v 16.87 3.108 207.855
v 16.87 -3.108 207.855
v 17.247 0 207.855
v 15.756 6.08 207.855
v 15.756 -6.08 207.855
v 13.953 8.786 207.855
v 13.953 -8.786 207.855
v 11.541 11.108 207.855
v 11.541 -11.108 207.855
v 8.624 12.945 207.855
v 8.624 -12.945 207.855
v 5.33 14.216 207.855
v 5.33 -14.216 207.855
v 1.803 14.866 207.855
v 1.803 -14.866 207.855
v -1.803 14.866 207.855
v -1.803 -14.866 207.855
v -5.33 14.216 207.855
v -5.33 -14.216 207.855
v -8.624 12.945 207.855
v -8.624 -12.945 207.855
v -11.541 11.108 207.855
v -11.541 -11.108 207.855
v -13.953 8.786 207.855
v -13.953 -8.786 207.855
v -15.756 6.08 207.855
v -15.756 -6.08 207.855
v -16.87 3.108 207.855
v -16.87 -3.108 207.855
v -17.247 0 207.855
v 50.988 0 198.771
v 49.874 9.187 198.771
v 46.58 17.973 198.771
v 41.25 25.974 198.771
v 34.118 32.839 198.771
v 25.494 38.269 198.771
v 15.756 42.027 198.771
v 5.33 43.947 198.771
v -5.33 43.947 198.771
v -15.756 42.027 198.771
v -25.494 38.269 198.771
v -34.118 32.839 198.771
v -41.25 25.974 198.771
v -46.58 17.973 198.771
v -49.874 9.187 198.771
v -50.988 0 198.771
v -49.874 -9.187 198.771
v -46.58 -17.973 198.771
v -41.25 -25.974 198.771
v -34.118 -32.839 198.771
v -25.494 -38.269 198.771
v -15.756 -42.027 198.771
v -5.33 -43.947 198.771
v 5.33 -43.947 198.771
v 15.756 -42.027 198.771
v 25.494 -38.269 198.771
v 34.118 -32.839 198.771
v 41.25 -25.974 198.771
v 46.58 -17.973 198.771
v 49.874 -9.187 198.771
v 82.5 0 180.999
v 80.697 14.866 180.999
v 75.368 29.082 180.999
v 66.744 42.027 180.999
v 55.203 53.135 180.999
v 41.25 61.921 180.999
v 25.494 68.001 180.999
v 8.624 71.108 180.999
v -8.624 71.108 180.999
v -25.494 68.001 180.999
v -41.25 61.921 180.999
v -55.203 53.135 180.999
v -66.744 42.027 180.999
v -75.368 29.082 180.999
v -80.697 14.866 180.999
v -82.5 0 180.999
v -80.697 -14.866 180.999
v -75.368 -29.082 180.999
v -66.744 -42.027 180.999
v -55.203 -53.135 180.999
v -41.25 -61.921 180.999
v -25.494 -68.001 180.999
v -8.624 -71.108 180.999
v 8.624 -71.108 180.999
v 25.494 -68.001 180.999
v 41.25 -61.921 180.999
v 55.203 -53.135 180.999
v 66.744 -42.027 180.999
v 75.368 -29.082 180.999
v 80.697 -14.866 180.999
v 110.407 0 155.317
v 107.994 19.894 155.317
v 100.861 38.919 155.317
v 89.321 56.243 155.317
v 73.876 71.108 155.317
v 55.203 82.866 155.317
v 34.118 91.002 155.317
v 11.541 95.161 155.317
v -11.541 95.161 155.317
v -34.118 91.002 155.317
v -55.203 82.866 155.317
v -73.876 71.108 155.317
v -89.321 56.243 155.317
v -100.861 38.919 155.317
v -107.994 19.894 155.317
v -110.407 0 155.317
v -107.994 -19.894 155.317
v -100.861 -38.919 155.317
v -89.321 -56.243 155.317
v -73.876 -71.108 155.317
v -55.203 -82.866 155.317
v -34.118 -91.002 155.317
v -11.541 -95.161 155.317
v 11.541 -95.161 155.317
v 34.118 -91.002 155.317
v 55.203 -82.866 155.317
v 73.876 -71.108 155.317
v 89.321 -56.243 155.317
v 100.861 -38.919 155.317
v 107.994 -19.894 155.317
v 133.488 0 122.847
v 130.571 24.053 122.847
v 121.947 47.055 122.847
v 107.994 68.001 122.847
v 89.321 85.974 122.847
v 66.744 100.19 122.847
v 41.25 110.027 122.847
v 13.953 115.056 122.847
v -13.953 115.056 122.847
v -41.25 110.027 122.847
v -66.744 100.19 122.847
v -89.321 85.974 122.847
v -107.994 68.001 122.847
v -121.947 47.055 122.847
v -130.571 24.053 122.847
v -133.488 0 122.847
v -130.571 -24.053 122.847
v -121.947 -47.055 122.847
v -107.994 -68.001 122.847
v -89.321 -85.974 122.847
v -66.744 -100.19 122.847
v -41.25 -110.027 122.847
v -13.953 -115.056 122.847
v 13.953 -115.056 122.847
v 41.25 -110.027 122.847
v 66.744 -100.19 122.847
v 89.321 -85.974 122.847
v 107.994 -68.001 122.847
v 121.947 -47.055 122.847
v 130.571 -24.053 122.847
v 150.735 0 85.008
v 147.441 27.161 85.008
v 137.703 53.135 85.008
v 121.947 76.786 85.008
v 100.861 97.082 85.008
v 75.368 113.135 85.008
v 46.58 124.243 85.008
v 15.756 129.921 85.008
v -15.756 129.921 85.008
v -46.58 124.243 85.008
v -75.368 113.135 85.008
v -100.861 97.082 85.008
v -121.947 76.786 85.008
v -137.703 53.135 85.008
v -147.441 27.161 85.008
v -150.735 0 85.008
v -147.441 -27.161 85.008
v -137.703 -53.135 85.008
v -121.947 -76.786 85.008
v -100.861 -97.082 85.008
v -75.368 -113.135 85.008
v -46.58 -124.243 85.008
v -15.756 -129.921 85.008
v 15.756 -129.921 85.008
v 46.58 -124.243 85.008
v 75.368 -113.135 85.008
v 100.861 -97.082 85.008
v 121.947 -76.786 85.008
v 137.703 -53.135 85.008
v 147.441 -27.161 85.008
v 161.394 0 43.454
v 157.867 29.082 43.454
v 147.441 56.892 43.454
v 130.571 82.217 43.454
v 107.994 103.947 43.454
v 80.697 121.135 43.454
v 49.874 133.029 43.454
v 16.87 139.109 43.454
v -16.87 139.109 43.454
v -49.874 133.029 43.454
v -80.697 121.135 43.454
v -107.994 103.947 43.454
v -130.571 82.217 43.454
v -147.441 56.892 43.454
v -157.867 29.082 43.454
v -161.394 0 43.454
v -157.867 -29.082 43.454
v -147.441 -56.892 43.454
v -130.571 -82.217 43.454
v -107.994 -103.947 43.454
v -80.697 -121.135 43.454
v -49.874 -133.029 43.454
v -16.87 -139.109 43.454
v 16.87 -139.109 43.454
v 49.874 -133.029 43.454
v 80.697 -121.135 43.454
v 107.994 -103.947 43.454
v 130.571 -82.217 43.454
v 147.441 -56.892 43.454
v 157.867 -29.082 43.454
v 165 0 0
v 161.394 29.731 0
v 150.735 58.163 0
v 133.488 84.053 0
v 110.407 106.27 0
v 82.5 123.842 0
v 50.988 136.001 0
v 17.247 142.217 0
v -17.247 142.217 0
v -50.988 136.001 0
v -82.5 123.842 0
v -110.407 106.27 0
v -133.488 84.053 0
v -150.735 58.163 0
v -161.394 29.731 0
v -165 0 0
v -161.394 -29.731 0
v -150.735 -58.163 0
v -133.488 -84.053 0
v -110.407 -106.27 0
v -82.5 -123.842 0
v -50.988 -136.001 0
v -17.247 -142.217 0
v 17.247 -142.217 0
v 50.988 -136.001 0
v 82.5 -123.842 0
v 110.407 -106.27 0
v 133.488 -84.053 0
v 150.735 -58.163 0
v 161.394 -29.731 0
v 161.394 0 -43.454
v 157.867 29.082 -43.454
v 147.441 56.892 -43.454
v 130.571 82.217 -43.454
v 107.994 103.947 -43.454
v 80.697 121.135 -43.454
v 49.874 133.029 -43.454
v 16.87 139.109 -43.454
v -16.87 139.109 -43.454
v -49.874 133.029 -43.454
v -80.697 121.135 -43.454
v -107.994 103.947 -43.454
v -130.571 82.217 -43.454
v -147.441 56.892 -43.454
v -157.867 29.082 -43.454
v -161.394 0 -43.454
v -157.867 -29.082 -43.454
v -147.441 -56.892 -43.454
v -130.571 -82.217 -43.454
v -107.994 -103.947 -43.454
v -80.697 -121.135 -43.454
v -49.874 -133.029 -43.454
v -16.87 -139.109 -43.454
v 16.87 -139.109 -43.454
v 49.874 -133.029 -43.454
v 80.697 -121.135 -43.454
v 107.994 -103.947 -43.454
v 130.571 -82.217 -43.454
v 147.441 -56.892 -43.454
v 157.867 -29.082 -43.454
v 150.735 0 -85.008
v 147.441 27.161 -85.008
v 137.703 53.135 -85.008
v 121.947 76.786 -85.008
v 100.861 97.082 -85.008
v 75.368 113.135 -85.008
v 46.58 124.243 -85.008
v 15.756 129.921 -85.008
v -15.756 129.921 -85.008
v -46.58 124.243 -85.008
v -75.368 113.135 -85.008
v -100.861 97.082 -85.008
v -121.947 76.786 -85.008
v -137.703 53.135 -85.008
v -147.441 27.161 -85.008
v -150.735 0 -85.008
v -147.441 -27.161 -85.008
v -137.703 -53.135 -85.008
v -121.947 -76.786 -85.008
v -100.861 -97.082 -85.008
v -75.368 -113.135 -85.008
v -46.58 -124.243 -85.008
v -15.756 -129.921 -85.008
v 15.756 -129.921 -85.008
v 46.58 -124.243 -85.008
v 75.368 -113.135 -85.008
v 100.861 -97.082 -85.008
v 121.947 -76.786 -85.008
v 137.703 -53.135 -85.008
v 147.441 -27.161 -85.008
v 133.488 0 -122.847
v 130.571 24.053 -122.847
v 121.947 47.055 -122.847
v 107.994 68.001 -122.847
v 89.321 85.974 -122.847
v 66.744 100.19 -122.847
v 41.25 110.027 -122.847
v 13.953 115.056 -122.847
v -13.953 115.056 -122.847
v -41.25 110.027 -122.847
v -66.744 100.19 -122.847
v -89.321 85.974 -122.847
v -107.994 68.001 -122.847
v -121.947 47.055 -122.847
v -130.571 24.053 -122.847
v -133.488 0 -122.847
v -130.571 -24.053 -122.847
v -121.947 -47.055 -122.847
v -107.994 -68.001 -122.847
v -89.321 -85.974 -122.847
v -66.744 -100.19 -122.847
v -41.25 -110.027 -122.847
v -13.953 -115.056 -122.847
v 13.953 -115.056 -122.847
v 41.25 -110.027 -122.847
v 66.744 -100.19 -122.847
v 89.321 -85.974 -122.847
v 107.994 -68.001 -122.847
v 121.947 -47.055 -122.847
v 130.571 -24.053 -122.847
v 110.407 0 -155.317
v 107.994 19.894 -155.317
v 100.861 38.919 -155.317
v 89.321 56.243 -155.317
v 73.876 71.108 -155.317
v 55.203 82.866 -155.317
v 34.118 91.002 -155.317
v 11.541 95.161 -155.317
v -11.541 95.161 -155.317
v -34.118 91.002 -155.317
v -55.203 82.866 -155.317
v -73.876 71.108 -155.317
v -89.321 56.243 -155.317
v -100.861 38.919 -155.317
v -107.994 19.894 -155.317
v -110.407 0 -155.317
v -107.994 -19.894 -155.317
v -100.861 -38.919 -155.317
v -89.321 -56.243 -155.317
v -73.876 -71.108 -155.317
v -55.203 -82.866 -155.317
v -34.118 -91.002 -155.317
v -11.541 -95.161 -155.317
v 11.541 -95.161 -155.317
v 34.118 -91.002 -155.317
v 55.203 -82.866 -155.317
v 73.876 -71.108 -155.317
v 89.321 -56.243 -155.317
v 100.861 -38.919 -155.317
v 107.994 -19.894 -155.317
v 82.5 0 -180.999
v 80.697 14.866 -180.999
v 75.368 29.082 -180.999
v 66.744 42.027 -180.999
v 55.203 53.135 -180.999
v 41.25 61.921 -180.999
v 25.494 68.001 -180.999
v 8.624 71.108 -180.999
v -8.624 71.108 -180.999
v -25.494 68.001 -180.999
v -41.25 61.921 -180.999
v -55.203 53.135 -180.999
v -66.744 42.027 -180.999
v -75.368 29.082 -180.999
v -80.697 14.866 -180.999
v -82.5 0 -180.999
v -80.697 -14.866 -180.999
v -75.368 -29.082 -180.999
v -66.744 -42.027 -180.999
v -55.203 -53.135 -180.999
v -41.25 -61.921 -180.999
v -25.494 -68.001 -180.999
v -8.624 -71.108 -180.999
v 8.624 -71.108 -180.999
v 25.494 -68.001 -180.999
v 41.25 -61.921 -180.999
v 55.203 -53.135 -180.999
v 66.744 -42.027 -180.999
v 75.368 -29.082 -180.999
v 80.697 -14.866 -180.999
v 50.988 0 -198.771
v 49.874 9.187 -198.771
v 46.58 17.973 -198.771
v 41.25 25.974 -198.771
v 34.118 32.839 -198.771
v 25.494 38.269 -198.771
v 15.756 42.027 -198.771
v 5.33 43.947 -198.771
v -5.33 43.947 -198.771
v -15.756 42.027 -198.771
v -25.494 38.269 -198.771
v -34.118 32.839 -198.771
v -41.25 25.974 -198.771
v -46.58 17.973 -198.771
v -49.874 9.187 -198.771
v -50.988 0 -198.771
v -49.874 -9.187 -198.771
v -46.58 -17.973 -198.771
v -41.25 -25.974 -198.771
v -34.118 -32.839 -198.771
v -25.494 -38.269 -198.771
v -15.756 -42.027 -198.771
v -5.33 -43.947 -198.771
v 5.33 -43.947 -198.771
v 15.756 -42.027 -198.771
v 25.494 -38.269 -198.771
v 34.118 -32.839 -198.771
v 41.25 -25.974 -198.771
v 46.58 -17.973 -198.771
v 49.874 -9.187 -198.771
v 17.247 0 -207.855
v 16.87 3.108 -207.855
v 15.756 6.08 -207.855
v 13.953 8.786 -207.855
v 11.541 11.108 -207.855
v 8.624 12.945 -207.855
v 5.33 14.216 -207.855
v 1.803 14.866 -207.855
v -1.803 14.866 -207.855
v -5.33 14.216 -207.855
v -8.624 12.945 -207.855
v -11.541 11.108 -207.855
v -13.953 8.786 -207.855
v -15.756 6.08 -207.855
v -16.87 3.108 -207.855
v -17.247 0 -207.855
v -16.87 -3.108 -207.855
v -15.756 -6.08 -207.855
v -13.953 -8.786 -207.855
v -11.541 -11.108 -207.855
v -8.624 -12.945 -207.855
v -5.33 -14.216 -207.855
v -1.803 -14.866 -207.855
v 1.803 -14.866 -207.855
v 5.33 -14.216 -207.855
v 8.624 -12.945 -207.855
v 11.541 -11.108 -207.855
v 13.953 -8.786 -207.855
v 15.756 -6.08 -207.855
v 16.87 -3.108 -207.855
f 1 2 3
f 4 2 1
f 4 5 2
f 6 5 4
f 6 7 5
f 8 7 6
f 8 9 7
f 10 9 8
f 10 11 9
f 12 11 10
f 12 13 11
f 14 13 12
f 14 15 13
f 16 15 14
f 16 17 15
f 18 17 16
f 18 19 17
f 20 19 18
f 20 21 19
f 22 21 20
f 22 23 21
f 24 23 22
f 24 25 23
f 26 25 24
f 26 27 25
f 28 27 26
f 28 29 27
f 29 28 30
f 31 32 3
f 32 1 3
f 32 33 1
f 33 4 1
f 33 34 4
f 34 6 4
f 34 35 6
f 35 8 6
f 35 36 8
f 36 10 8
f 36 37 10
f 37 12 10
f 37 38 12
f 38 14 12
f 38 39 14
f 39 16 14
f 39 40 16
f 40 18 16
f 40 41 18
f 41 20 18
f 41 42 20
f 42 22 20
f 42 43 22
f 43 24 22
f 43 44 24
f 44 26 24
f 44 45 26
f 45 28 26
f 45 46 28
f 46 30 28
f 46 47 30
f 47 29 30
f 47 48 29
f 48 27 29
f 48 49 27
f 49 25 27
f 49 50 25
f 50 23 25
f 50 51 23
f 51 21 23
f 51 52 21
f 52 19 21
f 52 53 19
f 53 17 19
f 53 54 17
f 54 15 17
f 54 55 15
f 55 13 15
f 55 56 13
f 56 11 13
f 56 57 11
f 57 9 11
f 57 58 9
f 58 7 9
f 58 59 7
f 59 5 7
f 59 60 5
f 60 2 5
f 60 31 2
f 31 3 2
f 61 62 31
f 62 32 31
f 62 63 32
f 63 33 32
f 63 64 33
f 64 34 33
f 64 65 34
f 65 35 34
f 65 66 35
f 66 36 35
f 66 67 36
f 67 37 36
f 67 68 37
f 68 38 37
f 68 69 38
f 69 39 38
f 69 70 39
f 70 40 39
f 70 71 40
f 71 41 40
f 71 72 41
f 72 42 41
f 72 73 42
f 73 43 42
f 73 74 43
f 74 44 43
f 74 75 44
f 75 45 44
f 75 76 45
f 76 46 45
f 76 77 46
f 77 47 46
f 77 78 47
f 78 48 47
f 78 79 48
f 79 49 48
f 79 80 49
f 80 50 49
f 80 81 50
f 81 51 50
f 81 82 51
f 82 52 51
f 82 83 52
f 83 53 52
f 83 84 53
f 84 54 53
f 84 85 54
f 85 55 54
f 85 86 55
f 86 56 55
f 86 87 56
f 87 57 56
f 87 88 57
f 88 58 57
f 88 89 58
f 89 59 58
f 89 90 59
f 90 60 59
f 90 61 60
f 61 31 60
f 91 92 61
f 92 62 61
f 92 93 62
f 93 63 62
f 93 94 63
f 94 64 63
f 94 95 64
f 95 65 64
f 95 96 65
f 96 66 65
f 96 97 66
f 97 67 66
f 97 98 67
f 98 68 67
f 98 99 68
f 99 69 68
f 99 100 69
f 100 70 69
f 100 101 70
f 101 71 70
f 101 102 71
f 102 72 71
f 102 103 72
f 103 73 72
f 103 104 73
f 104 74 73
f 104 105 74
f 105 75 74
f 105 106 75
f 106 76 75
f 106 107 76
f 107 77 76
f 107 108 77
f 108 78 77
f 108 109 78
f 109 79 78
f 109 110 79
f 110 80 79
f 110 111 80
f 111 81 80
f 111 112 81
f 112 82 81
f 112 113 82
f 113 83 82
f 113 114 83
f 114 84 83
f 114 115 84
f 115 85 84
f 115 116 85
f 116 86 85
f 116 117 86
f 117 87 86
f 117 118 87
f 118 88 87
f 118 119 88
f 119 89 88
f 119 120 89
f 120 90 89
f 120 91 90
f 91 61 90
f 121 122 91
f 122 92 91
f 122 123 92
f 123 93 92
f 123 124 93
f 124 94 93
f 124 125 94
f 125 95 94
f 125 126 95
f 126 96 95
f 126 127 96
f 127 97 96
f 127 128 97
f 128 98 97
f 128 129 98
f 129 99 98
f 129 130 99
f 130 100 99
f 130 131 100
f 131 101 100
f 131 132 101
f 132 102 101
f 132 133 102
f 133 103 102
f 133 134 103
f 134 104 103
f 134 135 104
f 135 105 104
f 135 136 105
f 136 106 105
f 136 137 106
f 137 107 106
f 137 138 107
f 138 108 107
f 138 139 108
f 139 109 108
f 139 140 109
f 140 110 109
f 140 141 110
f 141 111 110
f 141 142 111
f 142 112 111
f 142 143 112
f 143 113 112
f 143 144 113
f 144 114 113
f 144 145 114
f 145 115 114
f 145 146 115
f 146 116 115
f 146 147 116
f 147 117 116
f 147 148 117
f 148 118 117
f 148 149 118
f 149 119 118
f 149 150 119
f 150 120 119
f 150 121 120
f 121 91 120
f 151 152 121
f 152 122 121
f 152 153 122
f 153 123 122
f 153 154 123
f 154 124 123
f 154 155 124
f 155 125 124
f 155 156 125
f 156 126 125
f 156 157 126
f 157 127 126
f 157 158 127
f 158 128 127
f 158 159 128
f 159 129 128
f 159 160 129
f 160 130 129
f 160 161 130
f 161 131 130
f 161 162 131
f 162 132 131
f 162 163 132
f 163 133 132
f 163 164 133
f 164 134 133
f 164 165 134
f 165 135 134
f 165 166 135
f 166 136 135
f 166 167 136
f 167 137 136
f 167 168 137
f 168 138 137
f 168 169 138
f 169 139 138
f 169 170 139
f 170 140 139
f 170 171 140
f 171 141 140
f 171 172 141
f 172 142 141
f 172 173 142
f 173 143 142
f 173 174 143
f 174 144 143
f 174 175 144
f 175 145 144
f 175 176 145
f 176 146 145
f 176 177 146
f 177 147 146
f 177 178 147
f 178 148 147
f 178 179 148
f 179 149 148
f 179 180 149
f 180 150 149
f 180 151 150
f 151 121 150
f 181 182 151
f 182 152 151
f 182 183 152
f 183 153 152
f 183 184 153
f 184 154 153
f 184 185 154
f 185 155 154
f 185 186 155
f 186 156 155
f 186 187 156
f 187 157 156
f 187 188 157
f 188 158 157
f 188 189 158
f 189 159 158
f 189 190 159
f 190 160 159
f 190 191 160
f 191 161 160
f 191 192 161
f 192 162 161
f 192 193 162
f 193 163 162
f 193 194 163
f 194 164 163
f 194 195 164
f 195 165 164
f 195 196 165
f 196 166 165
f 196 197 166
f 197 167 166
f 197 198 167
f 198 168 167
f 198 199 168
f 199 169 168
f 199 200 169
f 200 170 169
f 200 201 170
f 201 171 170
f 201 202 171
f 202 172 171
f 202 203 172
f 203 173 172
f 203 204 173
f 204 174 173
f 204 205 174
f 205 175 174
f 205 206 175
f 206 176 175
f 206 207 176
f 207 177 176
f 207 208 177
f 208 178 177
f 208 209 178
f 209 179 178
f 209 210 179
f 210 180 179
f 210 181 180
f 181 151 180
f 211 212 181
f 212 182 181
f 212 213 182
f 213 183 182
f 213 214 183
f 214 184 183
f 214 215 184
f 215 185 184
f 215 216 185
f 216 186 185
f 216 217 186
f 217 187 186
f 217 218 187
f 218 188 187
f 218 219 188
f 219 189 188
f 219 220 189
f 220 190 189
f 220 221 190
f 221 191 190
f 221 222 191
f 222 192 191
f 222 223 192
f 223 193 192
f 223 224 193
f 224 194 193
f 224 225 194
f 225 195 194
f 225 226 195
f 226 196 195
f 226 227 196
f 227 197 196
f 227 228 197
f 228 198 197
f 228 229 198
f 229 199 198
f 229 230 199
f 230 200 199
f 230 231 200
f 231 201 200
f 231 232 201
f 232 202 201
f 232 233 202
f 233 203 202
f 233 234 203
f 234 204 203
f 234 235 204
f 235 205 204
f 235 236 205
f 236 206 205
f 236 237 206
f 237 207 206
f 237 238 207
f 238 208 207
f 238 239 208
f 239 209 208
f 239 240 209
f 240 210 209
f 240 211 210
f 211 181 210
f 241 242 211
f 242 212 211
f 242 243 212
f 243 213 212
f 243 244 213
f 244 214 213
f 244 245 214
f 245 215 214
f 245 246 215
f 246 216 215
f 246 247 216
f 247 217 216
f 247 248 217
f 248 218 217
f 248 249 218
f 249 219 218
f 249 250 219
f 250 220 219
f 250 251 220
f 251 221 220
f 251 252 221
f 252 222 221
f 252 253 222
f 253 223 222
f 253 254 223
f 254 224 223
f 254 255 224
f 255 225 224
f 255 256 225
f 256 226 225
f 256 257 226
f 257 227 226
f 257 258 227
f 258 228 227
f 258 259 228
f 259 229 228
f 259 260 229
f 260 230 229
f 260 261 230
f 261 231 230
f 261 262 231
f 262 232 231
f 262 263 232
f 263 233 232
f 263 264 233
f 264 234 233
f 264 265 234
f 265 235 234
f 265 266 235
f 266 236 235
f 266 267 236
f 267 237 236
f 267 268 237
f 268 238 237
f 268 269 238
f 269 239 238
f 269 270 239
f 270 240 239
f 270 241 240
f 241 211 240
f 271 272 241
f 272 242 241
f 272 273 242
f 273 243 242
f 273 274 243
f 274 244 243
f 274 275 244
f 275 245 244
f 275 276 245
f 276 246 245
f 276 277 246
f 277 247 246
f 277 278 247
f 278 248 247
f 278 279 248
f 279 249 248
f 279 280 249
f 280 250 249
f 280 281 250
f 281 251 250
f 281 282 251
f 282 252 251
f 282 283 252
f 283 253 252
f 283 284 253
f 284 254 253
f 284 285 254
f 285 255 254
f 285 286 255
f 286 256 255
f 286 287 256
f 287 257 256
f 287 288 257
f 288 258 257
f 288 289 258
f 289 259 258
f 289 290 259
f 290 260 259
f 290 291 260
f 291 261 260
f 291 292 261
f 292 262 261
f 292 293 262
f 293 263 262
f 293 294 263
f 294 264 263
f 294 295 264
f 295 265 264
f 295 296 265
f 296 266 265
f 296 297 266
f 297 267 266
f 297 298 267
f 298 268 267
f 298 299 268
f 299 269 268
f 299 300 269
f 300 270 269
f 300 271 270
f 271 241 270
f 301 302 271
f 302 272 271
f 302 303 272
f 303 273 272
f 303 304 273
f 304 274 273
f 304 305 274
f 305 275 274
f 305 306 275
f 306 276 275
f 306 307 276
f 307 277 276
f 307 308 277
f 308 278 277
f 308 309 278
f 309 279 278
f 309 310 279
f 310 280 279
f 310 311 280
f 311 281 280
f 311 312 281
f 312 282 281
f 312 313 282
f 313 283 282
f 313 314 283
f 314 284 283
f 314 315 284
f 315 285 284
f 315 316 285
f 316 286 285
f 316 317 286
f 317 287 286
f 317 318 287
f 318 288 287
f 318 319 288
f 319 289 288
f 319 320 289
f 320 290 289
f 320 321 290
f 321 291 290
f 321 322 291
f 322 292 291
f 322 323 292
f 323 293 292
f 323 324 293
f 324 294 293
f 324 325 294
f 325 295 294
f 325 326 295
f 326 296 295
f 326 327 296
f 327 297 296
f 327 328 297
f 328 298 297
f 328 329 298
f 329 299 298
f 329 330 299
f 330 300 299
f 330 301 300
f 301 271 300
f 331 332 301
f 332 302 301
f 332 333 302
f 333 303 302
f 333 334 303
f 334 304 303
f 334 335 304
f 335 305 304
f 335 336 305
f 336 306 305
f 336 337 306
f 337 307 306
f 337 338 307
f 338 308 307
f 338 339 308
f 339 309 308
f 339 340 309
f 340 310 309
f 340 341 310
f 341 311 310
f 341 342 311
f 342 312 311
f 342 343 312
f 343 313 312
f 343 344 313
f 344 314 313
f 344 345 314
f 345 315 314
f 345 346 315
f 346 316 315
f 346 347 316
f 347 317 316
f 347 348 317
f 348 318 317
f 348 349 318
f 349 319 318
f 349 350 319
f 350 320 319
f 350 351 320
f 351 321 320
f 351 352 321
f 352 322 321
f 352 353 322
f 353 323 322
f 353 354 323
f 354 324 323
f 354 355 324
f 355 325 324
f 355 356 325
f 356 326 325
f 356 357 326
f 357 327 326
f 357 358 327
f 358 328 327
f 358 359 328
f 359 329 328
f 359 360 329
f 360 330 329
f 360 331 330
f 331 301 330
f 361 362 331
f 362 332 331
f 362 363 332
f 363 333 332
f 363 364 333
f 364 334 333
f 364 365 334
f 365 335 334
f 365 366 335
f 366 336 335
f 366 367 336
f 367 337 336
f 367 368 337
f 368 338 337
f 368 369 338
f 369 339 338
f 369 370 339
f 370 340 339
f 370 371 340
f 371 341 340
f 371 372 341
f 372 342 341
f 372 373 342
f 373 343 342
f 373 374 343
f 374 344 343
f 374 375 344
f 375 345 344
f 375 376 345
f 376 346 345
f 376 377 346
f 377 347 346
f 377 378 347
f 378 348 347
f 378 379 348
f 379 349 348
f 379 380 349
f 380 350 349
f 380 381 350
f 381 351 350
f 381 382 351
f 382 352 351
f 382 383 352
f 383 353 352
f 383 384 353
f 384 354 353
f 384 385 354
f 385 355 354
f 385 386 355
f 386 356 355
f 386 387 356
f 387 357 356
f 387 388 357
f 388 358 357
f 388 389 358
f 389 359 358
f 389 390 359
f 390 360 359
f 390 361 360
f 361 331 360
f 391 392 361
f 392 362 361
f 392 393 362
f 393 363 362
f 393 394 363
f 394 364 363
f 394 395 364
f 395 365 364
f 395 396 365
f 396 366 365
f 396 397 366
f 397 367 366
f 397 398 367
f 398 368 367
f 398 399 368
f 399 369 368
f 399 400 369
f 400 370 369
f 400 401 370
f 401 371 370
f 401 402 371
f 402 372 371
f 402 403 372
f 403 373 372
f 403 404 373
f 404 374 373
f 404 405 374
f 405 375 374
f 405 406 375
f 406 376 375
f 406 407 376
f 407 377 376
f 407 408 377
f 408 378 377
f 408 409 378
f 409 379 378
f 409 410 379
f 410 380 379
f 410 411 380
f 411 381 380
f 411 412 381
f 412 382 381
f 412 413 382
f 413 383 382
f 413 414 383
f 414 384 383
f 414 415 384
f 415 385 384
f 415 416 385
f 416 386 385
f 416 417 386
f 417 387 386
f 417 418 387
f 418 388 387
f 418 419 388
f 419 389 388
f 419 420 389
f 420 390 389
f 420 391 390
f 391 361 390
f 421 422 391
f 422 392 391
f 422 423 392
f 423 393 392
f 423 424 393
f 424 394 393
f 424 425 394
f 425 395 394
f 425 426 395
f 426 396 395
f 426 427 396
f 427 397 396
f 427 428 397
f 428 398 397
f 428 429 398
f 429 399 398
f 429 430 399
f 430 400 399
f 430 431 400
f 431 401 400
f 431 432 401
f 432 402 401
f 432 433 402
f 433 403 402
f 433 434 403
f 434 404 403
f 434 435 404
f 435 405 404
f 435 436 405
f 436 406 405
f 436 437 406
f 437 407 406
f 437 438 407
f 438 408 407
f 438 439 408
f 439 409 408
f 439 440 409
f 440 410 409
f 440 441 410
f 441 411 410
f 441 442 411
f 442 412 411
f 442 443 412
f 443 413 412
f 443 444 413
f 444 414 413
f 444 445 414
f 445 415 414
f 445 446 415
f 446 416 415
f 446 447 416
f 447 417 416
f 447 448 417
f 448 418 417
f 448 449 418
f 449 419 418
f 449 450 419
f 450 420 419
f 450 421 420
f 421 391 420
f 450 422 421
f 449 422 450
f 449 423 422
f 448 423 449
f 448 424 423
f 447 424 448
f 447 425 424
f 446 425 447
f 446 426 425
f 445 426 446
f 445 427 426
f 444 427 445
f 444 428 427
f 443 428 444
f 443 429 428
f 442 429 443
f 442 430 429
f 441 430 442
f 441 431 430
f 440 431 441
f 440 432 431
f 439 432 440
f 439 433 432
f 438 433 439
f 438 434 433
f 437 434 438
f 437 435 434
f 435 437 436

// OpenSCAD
// Generated by SolidPython 1.0.1 on 2020-07-29 00:46:52


scale(v = [15, 13, 19]) {
	sphere(r = 11);
}
/***********************************************
*********      SolidPython code:      **********
************************************************
 
# import packages: SolidPython
from solid import *
from solid.utils import *
from itertools import chain, combinations, permutations


class Resize:

    def __init__(self, scad_file):
        self.scad_file = scad_file
        #self.scad_file = import_scad(scad_file)
        # cone/cylinder param:
        self.r1 = 0
        self.r2 = 0
        self.h = 0
        # rectangular prism param:
        self.w = 0
        self.l = 0
        # ellipse param:
        self.r = 0

    # import OpenScad code (file name corresponds to shape)


    # classify shape + parameters
    def assign(self, param1, param2, param3):
        if self.scad_file == 'cone.scad':
            self.r1 = param1
            self.r2 = param2
            self.h = param3
        elif self.scad_file == 'cylinder.scad':
            self.r1 = param1
            self.r2 = param2
            self.h = param3
        elif self.scad_file == 'rectangularPrism.scad':
            self.h = param1
            self.l = param2
            self.w = param3
        else:
            self.r = param1
            self.h = param2

    # resize parameters
    def iterate(self):
        x = range(3, 20, 2)
        i = 1
        if self.scad_file == 'cone.scad':
            tempList = list(permutations(x, 2))
            for temp in tempList:
                param1 = temp[0]
                param2 = temp[1]
                filepath = 'produced_scad_files/' + 'cone' + str(param1) + '_' + str(param2) + '_' + '.scad'
                scad_render_to_file(cylinder(h=param1, r1=param2, r2=0), filepath)

        elif self.scad_file == 'cylinder.scad':
            tempList = list(permutations(x, 3))
            for temp in tempList:
                param1 = temp[0]
                param2 = temp[1]
                filepath = 'produced_scad_files/' + 'cylinder' + str(param1) + '_' + str(param2) + '_' + '.scad'
                scad_render_to_file(cylinder(h=param1, r1=param2, r2=param2), filepath)

        elif self.scad_file == 'rectangularPrism.scad':
            tempList = list(permutations(x, 3))
            for temp in tempList:
                param1 = temp[0]
                param2 = temp[1]
                param3 = temp[2]
                filepath = 'produced_scad_files/' + 'rectangularPrism' + str(param1) + '_' + str(param2) + '_' + str(
                    param3) + '.scad'
                scad_render_to_file(cube(size=(param1, param2, param3)), filepath)

        elif self.scad_file == 'ellipse.scad':
            tempList = list(permutations(x, 4))
            for temp in tempList:
                param1 = temp[0]
                param2 = temp[1]
                param3 = temp[2]
                param4 = temp[3]
                filepath = 'produced_scad_files/' + 'ellipse' + str(param1) + '_' + str(param2) + '_' + str(param3) + '_' + str(param4) + '.scad'
                scad_render_to_file(scale([param1, param2, param3])(sphere(r=param4)), filepath)

    def render_to_scadfile(self):
        scad_render_to_file(scad, 'example.scad') 
 
************************************************/
